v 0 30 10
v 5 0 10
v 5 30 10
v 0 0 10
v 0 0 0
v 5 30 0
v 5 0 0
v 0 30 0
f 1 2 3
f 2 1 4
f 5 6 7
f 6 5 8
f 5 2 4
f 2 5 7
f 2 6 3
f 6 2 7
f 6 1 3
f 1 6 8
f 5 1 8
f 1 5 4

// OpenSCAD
// Generated by generate_scads.py
cube(size=[5,30,10], center=false);
